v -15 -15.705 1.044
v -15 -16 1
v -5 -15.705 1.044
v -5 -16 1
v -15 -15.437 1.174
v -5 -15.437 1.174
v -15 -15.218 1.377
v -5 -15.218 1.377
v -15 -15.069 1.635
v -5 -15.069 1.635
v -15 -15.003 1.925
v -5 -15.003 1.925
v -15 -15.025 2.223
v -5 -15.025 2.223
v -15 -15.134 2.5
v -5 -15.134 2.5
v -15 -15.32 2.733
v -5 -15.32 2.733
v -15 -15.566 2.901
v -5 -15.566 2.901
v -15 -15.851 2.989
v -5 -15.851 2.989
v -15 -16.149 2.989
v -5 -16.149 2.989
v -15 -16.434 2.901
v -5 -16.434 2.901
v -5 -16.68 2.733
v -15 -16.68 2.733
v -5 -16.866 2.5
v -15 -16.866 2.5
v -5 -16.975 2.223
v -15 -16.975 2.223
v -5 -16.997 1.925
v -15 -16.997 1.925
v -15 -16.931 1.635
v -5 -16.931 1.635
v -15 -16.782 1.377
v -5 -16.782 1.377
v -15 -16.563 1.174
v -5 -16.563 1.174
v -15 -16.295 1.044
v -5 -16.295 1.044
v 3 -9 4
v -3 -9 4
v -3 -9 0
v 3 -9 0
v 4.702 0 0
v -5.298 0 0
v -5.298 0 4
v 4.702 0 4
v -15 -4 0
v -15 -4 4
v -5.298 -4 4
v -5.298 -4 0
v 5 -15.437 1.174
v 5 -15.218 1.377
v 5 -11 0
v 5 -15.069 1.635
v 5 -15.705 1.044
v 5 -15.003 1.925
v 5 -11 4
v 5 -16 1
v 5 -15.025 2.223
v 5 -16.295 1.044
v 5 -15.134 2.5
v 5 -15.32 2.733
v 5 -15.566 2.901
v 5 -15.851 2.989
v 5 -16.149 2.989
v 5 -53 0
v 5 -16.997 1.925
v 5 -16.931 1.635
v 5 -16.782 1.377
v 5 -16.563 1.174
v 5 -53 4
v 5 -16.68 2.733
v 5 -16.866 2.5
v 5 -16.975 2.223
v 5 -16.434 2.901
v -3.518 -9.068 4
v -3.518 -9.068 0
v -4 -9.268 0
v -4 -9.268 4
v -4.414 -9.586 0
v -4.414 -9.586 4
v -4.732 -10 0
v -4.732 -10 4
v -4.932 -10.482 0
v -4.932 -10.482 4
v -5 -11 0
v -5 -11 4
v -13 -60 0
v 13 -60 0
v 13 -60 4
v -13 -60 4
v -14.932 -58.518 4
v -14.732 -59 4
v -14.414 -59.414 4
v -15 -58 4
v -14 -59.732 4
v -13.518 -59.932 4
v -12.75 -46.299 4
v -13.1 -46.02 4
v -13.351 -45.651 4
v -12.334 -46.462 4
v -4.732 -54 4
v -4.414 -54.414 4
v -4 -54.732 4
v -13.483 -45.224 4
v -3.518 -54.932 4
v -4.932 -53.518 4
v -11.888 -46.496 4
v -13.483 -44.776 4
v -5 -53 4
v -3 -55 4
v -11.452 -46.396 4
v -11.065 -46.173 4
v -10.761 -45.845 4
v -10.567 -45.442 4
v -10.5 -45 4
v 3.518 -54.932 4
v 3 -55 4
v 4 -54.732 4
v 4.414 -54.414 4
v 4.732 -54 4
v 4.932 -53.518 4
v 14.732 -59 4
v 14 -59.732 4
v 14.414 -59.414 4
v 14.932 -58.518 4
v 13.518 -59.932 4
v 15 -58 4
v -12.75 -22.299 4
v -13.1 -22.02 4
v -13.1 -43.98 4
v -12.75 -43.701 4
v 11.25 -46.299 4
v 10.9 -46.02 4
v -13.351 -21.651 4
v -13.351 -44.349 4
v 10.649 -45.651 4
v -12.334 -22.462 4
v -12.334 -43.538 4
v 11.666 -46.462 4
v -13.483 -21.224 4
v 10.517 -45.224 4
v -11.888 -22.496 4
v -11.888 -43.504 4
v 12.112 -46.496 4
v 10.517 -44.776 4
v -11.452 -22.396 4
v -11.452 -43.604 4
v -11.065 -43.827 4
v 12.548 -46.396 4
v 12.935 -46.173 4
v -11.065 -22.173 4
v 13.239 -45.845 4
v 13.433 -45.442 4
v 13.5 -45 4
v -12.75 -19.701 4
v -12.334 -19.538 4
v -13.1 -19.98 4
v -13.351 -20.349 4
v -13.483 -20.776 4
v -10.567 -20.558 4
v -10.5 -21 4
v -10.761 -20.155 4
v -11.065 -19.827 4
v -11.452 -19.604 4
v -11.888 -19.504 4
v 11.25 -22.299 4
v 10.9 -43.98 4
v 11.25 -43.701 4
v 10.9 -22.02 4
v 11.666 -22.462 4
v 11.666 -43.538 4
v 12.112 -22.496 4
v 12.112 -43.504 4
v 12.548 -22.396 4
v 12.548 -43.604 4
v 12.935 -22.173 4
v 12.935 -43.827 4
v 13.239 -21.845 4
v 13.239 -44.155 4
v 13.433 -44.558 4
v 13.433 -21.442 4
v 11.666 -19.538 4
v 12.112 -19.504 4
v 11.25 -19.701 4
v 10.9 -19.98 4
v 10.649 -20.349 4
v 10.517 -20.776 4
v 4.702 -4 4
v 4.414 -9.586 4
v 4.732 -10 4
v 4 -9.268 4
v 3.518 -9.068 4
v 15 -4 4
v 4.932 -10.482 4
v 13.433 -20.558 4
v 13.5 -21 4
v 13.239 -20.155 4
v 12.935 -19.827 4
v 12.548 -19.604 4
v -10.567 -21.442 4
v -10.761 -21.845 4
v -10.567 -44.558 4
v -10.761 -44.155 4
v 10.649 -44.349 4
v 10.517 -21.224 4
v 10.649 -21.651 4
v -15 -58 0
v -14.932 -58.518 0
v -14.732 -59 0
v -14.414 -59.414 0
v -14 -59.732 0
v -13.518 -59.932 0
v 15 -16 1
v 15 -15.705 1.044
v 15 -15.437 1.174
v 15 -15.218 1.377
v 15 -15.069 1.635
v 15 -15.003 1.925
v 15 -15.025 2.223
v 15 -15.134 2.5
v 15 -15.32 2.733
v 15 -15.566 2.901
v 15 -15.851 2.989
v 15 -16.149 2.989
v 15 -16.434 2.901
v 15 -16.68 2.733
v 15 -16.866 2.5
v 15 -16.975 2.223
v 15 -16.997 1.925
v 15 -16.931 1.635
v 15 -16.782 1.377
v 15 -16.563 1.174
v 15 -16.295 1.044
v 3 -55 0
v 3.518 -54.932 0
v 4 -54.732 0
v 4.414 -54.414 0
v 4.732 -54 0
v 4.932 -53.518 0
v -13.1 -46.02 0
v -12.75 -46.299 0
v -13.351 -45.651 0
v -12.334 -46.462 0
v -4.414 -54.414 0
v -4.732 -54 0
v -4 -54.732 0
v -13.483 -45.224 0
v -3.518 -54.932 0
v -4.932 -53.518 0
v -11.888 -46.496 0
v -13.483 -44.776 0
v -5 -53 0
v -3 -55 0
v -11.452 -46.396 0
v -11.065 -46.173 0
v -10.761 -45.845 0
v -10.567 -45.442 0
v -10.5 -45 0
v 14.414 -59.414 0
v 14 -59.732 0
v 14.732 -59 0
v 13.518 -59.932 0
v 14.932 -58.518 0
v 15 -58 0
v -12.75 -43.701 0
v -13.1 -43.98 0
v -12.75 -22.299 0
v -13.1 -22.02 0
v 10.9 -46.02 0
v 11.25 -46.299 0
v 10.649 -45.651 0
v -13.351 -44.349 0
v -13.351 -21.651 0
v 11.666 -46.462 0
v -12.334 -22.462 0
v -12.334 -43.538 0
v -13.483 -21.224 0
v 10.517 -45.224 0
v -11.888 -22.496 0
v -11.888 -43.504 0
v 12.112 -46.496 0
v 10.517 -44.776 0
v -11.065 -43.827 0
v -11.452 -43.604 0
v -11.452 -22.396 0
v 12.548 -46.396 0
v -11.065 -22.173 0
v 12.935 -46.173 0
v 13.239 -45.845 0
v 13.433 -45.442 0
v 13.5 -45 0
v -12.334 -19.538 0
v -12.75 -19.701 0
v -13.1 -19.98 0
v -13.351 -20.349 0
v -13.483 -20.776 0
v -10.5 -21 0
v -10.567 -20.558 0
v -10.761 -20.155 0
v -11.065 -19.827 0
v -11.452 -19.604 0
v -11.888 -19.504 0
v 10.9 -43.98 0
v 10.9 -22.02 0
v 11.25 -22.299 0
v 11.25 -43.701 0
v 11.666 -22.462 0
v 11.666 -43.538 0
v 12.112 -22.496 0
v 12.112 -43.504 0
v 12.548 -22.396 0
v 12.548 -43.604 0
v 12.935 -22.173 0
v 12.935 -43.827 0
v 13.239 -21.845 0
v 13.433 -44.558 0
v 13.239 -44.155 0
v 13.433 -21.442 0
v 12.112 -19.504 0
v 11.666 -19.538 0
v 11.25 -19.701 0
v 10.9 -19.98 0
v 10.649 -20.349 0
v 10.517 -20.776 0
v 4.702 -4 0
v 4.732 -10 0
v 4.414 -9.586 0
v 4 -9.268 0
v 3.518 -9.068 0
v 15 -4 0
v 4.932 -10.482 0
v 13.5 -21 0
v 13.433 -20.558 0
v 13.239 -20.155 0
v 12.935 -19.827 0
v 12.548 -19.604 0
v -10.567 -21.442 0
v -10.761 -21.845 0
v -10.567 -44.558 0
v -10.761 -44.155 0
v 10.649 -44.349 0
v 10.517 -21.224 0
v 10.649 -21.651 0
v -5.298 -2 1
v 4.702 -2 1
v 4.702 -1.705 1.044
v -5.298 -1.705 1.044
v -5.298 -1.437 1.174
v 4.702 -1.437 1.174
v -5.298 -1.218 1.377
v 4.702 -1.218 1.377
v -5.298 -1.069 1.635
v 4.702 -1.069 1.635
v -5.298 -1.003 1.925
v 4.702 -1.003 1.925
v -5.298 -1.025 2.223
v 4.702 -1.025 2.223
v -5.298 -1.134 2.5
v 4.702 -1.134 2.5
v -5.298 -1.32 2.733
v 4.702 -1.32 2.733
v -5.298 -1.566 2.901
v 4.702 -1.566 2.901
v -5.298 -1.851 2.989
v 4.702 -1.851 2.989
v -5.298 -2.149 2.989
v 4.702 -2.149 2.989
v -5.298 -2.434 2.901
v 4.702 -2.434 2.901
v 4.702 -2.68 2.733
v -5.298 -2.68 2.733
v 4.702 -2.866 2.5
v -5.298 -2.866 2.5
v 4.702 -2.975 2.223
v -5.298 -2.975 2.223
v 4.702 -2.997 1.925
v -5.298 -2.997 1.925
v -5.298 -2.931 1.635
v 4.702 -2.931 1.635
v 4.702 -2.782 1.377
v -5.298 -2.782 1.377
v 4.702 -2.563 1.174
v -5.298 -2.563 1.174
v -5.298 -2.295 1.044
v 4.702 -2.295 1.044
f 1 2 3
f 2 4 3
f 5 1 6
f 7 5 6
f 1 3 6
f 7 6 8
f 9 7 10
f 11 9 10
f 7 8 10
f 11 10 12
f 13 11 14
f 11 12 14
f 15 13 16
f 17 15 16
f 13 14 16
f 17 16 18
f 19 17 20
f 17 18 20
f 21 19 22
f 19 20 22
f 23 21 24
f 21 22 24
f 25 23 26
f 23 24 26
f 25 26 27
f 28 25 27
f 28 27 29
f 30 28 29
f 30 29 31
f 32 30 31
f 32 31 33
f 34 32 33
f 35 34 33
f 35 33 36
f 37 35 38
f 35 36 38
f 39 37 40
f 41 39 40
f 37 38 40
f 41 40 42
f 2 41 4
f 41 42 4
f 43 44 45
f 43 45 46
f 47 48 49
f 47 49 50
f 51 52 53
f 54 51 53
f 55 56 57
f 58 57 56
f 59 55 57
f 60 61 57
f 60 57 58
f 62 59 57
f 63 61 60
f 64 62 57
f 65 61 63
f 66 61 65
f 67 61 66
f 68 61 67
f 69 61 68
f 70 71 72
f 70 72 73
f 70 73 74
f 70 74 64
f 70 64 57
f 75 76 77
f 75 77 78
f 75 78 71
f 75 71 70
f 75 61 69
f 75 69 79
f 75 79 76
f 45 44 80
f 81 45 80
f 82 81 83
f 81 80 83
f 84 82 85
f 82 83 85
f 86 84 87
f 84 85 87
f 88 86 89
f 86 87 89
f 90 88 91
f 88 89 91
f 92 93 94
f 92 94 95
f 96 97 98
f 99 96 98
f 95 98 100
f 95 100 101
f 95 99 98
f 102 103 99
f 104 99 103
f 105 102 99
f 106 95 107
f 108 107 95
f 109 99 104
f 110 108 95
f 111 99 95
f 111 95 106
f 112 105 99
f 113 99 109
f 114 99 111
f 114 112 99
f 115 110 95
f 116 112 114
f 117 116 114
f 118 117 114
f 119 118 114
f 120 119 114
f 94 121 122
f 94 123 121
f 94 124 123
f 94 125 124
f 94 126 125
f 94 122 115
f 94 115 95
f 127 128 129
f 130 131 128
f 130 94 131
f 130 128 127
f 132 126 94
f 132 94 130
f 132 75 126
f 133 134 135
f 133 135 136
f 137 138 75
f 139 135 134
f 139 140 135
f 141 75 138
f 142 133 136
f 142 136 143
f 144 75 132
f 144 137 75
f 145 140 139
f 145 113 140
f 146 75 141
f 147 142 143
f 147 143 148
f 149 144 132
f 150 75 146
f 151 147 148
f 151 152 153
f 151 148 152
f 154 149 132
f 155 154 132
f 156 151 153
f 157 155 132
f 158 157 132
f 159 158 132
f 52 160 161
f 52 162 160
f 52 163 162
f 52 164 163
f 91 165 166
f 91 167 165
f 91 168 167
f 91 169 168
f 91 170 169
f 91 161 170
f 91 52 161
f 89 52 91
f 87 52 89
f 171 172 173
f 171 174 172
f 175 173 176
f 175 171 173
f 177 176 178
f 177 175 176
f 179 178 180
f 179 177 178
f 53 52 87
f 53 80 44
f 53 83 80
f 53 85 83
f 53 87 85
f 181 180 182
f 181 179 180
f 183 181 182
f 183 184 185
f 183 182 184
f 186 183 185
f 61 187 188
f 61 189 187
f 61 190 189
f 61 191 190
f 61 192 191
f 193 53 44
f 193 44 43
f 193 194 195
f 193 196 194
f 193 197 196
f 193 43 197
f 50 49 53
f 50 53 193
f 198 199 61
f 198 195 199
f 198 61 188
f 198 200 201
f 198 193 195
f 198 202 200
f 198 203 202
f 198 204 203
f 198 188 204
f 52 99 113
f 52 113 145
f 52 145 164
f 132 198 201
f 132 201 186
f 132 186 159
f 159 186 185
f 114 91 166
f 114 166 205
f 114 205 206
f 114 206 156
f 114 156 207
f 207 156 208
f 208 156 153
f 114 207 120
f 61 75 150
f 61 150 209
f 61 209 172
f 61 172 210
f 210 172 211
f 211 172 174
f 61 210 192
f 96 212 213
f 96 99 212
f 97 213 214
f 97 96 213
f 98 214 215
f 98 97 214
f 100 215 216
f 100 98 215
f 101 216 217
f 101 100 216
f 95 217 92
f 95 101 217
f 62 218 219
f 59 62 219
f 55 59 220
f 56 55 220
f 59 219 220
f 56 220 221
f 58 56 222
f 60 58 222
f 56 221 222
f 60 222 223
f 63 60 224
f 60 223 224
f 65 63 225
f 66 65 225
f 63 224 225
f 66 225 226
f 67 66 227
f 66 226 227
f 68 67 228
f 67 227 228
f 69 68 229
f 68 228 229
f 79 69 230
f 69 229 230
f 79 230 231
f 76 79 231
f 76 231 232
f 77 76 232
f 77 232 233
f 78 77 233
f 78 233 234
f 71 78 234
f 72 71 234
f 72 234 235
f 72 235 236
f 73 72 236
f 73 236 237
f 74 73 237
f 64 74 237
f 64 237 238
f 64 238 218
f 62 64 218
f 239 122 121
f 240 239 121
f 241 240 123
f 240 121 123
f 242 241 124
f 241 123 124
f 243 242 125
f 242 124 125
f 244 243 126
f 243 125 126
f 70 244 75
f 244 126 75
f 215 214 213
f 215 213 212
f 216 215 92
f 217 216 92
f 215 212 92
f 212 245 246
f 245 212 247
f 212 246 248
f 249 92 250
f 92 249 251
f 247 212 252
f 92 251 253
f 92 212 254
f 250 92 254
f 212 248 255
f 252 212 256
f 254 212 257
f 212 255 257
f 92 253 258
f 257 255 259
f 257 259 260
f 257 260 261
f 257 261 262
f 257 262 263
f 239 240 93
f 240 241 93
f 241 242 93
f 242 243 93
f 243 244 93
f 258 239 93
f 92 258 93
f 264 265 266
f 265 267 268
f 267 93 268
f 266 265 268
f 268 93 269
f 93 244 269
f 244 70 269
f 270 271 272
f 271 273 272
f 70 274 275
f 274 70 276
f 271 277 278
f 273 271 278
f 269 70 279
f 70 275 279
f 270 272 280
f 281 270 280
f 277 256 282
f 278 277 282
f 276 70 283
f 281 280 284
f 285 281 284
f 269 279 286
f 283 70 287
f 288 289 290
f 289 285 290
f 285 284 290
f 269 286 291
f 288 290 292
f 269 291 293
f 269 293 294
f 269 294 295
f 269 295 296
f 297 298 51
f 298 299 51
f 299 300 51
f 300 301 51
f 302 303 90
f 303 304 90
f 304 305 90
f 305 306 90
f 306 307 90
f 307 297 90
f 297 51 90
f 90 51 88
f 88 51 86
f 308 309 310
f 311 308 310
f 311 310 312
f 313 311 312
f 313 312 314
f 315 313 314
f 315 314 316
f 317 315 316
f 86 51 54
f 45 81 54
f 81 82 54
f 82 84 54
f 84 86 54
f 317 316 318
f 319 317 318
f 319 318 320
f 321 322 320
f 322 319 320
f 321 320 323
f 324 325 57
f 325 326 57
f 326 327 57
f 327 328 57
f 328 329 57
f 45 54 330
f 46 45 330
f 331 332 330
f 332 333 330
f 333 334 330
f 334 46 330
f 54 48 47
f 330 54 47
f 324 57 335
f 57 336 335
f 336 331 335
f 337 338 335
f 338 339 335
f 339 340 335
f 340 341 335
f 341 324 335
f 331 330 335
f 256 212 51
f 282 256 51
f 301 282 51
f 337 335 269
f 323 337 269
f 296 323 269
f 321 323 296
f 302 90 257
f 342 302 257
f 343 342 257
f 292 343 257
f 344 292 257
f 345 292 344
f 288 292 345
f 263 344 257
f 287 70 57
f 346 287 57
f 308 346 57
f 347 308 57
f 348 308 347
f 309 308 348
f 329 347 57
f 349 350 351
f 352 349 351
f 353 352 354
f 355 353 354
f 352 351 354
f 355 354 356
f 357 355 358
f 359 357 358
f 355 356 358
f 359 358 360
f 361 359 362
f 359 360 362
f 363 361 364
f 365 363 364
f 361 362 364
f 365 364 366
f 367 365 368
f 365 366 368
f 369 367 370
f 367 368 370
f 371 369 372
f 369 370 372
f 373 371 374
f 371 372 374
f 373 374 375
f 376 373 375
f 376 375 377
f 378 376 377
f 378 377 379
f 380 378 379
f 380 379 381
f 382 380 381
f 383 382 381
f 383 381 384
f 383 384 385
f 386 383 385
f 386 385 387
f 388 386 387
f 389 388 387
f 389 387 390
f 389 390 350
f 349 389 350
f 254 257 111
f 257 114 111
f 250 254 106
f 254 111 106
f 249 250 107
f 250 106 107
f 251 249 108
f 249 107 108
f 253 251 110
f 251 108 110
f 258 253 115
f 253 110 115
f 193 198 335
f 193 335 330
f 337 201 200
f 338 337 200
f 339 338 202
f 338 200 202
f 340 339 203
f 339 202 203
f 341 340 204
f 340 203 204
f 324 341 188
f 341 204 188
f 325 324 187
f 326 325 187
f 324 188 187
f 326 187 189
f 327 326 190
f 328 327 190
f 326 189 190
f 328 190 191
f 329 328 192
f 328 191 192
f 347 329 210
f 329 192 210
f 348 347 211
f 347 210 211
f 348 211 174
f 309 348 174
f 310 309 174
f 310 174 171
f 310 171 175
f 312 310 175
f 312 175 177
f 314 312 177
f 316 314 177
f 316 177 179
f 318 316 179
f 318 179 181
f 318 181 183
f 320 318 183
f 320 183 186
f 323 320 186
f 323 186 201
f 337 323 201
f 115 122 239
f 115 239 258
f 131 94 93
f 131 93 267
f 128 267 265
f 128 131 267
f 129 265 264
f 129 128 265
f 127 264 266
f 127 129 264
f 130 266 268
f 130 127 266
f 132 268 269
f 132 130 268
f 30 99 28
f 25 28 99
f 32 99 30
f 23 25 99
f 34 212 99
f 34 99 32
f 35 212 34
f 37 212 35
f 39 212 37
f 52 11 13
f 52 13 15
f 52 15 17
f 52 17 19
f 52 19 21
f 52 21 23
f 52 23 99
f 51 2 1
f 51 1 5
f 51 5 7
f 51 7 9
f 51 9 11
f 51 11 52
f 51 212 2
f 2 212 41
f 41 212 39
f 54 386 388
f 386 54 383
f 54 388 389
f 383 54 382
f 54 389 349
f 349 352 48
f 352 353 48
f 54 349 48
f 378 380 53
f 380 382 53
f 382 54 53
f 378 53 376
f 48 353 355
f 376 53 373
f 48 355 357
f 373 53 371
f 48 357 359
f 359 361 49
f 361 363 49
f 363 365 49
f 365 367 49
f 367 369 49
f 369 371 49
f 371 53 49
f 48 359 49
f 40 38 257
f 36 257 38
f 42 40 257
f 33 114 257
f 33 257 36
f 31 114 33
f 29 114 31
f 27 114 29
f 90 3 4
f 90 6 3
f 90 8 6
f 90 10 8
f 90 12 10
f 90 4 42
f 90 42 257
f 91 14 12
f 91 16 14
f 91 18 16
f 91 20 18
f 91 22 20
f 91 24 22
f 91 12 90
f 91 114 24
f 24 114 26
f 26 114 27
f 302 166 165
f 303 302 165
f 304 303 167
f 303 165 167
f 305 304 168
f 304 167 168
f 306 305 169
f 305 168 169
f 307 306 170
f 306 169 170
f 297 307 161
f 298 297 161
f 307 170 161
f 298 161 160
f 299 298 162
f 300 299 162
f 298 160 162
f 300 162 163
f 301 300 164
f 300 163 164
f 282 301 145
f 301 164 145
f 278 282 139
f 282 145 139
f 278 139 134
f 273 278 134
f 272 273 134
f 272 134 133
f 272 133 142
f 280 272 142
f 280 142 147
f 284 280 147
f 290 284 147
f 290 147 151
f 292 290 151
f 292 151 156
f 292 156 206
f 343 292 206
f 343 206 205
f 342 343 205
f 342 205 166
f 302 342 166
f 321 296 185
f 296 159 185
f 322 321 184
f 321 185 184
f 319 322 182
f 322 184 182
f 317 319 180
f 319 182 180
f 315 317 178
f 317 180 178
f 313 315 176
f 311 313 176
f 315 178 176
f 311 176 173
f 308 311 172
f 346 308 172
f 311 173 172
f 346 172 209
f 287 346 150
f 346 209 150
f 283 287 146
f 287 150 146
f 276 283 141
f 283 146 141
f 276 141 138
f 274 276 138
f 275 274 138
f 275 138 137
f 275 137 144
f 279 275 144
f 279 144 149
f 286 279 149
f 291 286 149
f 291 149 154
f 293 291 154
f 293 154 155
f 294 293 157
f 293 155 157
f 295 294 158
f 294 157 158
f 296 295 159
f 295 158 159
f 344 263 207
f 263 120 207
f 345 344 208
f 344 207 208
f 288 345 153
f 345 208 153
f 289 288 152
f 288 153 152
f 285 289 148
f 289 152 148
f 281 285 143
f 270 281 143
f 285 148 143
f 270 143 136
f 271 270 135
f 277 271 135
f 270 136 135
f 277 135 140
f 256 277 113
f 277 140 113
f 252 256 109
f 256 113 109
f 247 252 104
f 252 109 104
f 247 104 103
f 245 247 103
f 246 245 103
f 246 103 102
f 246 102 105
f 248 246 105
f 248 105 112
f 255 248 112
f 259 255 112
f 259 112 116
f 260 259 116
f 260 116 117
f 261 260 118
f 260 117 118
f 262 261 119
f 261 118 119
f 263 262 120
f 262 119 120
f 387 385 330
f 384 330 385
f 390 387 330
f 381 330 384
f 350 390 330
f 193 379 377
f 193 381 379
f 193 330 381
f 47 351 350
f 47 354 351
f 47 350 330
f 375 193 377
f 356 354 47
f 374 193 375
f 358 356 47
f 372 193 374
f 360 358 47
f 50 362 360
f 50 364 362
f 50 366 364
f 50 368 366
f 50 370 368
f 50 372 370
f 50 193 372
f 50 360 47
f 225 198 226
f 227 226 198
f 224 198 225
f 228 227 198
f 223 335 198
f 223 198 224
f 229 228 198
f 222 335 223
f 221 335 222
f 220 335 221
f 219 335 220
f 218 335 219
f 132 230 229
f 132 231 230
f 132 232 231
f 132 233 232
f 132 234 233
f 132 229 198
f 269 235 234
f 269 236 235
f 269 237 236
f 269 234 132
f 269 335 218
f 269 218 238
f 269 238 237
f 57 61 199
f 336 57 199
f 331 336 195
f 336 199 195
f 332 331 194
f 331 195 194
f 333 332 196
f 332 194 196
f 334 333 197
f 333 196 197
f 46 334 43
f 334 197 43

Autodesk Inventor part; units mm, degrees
ref_plane "YZ Plane" through (0, 0, 0) normal (1, 0, 0) x (0, 1, 0)
ref_plane "XZ Plane" through (0, 0, 0) normal (0, 1, 0) x (-1, 0, 0)
ref_plane "XY Plane" through (0, 0, 0) normal (0, 0, 1) x (1, 0, 0)
sketch "Sketch1" plane through (0, 0, 0) normal (0, 0, 1) x (1, 0, 0)
  line L0 (-15, 0) -> (15, 0)
  line L1 (15, 0) -> (15, -60)
  line L2 (15, -60) -> (-15, -60)
  line L3 (-15, -60) -> (-15, 0)
  line L4 (-21, 0) -> (21, 0) projected
  line L5 (0, -72) -> (0, 12) projected
  point P0 (0, 0)
  dimension "d0" = 30
  dimension "d1" = 60
  dimension "d4" = 15
extrude "Extrusion1" add sketch "Sketch1" along normal blind 4
sketch "Sketch2" plane through (0, 0, 4) normal (0, 0, 1) x (1, 0, 0)
  line L0 (15, 0) -> (-15, 0) projected
  line L1 (-15, 0) -> (-15, -60) projected
  line L2 (-15, -60) -> (15, -60) projected
  line L3 (15, -60) -> (15, 0) projected
  line L4 (0, -72) -> (0, 12) projected
  circle A0 centre (-12, -21) radius 1.5
  circle A1 centre (-12, -45) radius 1.5
  circle A2 centre (12, -21) radius 1.5
  circle A3 centre (12, -45) radius 1.5
  line L5 (15, 0) -> (-15, 0) projected
  line L6 (15, -60) -> (15, 0) projected
  line L7 (4.7021, 0) -> (15, 0)
  line L8 (15, 0) -> (15, -4)
  line L9 (15, -4) -> (4.7021, -4)
  line L10 (4.7021, -4) -> (4.7021, 0)
  line L11 (-15, 0) -> (-15, -60) projected
  line L12 (-5.2979, 0) -> (-15, 0)
  line L13 (-15, 0) -> (-15, -4)
  line L14 (-15, -4) -> (-5.2979, -4)
  line L15 (-5.2979, -4) -> (-5.2979, 0)
  line L16 (-3, -9) -> (3, -9)
  line L17 (5, -11) -> (5, -53)
  line L18 (3, -55) -> (-3, -55)
  line L19 (-5, -53) -> (-5, -11)
  arc A4 (-3, -9) -> (-5, -11) centre (-3, -11) ccw
  arc A5 (5, -11) -> (3, -9) centre (3, -11) ccw
  arc A6 (3, -55) -> (5, -53) centre (3, -53) ccw
  arc A7 (-5, -53) -> (-3, -55) centre (-3, -53) ccw
  point P0 (0, 0)
  dimension "d5" = 3
  dimension "d6" = 12
  dimension "d7" = 3
  dimension "d8" = 12
  dimension "d9" = 24
  dimension "d10" = 15
  dimension "d13" = 4
  dimension "d14" = 10
  dimension "d15" = 5
  dimension "d16" = 10
  dimension "d18" = 5
  dimension "d19" = 2
  dimension "d28" = 10
extrude "Extrusion2" cut sketch "Sketch2" against normal blind 4 contours L3 L9 L10 L0 | L15 L14 L1 L0 | L16 A5 L17 A6 L18 L4 | L4 L18 A7 L19 A4 L16 | A0 | A1 | A2 | A3
sketch "Sketch3" plane through (0, 0, 4) normal (0, 0, 1) x (1, 0, 0)
  point P0 (0, 0)
fillet "Fillet1" radius 2 2 edges at (15, -60, 2) (-15, -60, 2)
sketch "Sketch4" plane through (4.7021, -4, 4) normal (1, 0, 0) x (0, 0, -1)
  line L0 (0, 0) -> (0, 4) projected
  line L1 (0, 0) -> (4, 0) projected
  line L2 (4, 4) -> (4, 0) projected
  line L3 (0, 4) -> (4, 4) projected
  line L4 (0, 0) -> (4, 0) projected
  line L5 (2, 0) -> (2, 4) construction
  line L6 (0, 4) -> (4, 4) projected
  circle A0 centre (2, 2) radius 1
  dimension "d21" = 2
extrude "Extrusion3" cut sketch "Sketch4" against normal through all contours A0
sketch "Sketch5" plane through (15, -4, 4) normal (1, 0, 0) x (0, 0, -1)
  line L0 (4, -54) -> (0, -54) projected
  line L1 (4, 0) -> (4, -54) projected
  line L2 (4, 0) -> (0, 0) projected
  line L3 (0, -54) -> (0, 0) projected
  circle A0 centre (2, 2) radius 1 projected
  circle A1 centre (2, 2) radius 1 projected
  line L4 (2, 2) -> (2, -25.9382) construction
  circle A2 centre (2, -12) radius 1
  point P0 (4, 4)
  dimension "d24" = 2
  dimension "d25" = 14
extrude "Extrusion4" cut sketch "Sketch5" against normal through all contours A2
equation "\"d4\" = 0.5 * d0"
properties part number "BallBalancing_MotorPlate"
